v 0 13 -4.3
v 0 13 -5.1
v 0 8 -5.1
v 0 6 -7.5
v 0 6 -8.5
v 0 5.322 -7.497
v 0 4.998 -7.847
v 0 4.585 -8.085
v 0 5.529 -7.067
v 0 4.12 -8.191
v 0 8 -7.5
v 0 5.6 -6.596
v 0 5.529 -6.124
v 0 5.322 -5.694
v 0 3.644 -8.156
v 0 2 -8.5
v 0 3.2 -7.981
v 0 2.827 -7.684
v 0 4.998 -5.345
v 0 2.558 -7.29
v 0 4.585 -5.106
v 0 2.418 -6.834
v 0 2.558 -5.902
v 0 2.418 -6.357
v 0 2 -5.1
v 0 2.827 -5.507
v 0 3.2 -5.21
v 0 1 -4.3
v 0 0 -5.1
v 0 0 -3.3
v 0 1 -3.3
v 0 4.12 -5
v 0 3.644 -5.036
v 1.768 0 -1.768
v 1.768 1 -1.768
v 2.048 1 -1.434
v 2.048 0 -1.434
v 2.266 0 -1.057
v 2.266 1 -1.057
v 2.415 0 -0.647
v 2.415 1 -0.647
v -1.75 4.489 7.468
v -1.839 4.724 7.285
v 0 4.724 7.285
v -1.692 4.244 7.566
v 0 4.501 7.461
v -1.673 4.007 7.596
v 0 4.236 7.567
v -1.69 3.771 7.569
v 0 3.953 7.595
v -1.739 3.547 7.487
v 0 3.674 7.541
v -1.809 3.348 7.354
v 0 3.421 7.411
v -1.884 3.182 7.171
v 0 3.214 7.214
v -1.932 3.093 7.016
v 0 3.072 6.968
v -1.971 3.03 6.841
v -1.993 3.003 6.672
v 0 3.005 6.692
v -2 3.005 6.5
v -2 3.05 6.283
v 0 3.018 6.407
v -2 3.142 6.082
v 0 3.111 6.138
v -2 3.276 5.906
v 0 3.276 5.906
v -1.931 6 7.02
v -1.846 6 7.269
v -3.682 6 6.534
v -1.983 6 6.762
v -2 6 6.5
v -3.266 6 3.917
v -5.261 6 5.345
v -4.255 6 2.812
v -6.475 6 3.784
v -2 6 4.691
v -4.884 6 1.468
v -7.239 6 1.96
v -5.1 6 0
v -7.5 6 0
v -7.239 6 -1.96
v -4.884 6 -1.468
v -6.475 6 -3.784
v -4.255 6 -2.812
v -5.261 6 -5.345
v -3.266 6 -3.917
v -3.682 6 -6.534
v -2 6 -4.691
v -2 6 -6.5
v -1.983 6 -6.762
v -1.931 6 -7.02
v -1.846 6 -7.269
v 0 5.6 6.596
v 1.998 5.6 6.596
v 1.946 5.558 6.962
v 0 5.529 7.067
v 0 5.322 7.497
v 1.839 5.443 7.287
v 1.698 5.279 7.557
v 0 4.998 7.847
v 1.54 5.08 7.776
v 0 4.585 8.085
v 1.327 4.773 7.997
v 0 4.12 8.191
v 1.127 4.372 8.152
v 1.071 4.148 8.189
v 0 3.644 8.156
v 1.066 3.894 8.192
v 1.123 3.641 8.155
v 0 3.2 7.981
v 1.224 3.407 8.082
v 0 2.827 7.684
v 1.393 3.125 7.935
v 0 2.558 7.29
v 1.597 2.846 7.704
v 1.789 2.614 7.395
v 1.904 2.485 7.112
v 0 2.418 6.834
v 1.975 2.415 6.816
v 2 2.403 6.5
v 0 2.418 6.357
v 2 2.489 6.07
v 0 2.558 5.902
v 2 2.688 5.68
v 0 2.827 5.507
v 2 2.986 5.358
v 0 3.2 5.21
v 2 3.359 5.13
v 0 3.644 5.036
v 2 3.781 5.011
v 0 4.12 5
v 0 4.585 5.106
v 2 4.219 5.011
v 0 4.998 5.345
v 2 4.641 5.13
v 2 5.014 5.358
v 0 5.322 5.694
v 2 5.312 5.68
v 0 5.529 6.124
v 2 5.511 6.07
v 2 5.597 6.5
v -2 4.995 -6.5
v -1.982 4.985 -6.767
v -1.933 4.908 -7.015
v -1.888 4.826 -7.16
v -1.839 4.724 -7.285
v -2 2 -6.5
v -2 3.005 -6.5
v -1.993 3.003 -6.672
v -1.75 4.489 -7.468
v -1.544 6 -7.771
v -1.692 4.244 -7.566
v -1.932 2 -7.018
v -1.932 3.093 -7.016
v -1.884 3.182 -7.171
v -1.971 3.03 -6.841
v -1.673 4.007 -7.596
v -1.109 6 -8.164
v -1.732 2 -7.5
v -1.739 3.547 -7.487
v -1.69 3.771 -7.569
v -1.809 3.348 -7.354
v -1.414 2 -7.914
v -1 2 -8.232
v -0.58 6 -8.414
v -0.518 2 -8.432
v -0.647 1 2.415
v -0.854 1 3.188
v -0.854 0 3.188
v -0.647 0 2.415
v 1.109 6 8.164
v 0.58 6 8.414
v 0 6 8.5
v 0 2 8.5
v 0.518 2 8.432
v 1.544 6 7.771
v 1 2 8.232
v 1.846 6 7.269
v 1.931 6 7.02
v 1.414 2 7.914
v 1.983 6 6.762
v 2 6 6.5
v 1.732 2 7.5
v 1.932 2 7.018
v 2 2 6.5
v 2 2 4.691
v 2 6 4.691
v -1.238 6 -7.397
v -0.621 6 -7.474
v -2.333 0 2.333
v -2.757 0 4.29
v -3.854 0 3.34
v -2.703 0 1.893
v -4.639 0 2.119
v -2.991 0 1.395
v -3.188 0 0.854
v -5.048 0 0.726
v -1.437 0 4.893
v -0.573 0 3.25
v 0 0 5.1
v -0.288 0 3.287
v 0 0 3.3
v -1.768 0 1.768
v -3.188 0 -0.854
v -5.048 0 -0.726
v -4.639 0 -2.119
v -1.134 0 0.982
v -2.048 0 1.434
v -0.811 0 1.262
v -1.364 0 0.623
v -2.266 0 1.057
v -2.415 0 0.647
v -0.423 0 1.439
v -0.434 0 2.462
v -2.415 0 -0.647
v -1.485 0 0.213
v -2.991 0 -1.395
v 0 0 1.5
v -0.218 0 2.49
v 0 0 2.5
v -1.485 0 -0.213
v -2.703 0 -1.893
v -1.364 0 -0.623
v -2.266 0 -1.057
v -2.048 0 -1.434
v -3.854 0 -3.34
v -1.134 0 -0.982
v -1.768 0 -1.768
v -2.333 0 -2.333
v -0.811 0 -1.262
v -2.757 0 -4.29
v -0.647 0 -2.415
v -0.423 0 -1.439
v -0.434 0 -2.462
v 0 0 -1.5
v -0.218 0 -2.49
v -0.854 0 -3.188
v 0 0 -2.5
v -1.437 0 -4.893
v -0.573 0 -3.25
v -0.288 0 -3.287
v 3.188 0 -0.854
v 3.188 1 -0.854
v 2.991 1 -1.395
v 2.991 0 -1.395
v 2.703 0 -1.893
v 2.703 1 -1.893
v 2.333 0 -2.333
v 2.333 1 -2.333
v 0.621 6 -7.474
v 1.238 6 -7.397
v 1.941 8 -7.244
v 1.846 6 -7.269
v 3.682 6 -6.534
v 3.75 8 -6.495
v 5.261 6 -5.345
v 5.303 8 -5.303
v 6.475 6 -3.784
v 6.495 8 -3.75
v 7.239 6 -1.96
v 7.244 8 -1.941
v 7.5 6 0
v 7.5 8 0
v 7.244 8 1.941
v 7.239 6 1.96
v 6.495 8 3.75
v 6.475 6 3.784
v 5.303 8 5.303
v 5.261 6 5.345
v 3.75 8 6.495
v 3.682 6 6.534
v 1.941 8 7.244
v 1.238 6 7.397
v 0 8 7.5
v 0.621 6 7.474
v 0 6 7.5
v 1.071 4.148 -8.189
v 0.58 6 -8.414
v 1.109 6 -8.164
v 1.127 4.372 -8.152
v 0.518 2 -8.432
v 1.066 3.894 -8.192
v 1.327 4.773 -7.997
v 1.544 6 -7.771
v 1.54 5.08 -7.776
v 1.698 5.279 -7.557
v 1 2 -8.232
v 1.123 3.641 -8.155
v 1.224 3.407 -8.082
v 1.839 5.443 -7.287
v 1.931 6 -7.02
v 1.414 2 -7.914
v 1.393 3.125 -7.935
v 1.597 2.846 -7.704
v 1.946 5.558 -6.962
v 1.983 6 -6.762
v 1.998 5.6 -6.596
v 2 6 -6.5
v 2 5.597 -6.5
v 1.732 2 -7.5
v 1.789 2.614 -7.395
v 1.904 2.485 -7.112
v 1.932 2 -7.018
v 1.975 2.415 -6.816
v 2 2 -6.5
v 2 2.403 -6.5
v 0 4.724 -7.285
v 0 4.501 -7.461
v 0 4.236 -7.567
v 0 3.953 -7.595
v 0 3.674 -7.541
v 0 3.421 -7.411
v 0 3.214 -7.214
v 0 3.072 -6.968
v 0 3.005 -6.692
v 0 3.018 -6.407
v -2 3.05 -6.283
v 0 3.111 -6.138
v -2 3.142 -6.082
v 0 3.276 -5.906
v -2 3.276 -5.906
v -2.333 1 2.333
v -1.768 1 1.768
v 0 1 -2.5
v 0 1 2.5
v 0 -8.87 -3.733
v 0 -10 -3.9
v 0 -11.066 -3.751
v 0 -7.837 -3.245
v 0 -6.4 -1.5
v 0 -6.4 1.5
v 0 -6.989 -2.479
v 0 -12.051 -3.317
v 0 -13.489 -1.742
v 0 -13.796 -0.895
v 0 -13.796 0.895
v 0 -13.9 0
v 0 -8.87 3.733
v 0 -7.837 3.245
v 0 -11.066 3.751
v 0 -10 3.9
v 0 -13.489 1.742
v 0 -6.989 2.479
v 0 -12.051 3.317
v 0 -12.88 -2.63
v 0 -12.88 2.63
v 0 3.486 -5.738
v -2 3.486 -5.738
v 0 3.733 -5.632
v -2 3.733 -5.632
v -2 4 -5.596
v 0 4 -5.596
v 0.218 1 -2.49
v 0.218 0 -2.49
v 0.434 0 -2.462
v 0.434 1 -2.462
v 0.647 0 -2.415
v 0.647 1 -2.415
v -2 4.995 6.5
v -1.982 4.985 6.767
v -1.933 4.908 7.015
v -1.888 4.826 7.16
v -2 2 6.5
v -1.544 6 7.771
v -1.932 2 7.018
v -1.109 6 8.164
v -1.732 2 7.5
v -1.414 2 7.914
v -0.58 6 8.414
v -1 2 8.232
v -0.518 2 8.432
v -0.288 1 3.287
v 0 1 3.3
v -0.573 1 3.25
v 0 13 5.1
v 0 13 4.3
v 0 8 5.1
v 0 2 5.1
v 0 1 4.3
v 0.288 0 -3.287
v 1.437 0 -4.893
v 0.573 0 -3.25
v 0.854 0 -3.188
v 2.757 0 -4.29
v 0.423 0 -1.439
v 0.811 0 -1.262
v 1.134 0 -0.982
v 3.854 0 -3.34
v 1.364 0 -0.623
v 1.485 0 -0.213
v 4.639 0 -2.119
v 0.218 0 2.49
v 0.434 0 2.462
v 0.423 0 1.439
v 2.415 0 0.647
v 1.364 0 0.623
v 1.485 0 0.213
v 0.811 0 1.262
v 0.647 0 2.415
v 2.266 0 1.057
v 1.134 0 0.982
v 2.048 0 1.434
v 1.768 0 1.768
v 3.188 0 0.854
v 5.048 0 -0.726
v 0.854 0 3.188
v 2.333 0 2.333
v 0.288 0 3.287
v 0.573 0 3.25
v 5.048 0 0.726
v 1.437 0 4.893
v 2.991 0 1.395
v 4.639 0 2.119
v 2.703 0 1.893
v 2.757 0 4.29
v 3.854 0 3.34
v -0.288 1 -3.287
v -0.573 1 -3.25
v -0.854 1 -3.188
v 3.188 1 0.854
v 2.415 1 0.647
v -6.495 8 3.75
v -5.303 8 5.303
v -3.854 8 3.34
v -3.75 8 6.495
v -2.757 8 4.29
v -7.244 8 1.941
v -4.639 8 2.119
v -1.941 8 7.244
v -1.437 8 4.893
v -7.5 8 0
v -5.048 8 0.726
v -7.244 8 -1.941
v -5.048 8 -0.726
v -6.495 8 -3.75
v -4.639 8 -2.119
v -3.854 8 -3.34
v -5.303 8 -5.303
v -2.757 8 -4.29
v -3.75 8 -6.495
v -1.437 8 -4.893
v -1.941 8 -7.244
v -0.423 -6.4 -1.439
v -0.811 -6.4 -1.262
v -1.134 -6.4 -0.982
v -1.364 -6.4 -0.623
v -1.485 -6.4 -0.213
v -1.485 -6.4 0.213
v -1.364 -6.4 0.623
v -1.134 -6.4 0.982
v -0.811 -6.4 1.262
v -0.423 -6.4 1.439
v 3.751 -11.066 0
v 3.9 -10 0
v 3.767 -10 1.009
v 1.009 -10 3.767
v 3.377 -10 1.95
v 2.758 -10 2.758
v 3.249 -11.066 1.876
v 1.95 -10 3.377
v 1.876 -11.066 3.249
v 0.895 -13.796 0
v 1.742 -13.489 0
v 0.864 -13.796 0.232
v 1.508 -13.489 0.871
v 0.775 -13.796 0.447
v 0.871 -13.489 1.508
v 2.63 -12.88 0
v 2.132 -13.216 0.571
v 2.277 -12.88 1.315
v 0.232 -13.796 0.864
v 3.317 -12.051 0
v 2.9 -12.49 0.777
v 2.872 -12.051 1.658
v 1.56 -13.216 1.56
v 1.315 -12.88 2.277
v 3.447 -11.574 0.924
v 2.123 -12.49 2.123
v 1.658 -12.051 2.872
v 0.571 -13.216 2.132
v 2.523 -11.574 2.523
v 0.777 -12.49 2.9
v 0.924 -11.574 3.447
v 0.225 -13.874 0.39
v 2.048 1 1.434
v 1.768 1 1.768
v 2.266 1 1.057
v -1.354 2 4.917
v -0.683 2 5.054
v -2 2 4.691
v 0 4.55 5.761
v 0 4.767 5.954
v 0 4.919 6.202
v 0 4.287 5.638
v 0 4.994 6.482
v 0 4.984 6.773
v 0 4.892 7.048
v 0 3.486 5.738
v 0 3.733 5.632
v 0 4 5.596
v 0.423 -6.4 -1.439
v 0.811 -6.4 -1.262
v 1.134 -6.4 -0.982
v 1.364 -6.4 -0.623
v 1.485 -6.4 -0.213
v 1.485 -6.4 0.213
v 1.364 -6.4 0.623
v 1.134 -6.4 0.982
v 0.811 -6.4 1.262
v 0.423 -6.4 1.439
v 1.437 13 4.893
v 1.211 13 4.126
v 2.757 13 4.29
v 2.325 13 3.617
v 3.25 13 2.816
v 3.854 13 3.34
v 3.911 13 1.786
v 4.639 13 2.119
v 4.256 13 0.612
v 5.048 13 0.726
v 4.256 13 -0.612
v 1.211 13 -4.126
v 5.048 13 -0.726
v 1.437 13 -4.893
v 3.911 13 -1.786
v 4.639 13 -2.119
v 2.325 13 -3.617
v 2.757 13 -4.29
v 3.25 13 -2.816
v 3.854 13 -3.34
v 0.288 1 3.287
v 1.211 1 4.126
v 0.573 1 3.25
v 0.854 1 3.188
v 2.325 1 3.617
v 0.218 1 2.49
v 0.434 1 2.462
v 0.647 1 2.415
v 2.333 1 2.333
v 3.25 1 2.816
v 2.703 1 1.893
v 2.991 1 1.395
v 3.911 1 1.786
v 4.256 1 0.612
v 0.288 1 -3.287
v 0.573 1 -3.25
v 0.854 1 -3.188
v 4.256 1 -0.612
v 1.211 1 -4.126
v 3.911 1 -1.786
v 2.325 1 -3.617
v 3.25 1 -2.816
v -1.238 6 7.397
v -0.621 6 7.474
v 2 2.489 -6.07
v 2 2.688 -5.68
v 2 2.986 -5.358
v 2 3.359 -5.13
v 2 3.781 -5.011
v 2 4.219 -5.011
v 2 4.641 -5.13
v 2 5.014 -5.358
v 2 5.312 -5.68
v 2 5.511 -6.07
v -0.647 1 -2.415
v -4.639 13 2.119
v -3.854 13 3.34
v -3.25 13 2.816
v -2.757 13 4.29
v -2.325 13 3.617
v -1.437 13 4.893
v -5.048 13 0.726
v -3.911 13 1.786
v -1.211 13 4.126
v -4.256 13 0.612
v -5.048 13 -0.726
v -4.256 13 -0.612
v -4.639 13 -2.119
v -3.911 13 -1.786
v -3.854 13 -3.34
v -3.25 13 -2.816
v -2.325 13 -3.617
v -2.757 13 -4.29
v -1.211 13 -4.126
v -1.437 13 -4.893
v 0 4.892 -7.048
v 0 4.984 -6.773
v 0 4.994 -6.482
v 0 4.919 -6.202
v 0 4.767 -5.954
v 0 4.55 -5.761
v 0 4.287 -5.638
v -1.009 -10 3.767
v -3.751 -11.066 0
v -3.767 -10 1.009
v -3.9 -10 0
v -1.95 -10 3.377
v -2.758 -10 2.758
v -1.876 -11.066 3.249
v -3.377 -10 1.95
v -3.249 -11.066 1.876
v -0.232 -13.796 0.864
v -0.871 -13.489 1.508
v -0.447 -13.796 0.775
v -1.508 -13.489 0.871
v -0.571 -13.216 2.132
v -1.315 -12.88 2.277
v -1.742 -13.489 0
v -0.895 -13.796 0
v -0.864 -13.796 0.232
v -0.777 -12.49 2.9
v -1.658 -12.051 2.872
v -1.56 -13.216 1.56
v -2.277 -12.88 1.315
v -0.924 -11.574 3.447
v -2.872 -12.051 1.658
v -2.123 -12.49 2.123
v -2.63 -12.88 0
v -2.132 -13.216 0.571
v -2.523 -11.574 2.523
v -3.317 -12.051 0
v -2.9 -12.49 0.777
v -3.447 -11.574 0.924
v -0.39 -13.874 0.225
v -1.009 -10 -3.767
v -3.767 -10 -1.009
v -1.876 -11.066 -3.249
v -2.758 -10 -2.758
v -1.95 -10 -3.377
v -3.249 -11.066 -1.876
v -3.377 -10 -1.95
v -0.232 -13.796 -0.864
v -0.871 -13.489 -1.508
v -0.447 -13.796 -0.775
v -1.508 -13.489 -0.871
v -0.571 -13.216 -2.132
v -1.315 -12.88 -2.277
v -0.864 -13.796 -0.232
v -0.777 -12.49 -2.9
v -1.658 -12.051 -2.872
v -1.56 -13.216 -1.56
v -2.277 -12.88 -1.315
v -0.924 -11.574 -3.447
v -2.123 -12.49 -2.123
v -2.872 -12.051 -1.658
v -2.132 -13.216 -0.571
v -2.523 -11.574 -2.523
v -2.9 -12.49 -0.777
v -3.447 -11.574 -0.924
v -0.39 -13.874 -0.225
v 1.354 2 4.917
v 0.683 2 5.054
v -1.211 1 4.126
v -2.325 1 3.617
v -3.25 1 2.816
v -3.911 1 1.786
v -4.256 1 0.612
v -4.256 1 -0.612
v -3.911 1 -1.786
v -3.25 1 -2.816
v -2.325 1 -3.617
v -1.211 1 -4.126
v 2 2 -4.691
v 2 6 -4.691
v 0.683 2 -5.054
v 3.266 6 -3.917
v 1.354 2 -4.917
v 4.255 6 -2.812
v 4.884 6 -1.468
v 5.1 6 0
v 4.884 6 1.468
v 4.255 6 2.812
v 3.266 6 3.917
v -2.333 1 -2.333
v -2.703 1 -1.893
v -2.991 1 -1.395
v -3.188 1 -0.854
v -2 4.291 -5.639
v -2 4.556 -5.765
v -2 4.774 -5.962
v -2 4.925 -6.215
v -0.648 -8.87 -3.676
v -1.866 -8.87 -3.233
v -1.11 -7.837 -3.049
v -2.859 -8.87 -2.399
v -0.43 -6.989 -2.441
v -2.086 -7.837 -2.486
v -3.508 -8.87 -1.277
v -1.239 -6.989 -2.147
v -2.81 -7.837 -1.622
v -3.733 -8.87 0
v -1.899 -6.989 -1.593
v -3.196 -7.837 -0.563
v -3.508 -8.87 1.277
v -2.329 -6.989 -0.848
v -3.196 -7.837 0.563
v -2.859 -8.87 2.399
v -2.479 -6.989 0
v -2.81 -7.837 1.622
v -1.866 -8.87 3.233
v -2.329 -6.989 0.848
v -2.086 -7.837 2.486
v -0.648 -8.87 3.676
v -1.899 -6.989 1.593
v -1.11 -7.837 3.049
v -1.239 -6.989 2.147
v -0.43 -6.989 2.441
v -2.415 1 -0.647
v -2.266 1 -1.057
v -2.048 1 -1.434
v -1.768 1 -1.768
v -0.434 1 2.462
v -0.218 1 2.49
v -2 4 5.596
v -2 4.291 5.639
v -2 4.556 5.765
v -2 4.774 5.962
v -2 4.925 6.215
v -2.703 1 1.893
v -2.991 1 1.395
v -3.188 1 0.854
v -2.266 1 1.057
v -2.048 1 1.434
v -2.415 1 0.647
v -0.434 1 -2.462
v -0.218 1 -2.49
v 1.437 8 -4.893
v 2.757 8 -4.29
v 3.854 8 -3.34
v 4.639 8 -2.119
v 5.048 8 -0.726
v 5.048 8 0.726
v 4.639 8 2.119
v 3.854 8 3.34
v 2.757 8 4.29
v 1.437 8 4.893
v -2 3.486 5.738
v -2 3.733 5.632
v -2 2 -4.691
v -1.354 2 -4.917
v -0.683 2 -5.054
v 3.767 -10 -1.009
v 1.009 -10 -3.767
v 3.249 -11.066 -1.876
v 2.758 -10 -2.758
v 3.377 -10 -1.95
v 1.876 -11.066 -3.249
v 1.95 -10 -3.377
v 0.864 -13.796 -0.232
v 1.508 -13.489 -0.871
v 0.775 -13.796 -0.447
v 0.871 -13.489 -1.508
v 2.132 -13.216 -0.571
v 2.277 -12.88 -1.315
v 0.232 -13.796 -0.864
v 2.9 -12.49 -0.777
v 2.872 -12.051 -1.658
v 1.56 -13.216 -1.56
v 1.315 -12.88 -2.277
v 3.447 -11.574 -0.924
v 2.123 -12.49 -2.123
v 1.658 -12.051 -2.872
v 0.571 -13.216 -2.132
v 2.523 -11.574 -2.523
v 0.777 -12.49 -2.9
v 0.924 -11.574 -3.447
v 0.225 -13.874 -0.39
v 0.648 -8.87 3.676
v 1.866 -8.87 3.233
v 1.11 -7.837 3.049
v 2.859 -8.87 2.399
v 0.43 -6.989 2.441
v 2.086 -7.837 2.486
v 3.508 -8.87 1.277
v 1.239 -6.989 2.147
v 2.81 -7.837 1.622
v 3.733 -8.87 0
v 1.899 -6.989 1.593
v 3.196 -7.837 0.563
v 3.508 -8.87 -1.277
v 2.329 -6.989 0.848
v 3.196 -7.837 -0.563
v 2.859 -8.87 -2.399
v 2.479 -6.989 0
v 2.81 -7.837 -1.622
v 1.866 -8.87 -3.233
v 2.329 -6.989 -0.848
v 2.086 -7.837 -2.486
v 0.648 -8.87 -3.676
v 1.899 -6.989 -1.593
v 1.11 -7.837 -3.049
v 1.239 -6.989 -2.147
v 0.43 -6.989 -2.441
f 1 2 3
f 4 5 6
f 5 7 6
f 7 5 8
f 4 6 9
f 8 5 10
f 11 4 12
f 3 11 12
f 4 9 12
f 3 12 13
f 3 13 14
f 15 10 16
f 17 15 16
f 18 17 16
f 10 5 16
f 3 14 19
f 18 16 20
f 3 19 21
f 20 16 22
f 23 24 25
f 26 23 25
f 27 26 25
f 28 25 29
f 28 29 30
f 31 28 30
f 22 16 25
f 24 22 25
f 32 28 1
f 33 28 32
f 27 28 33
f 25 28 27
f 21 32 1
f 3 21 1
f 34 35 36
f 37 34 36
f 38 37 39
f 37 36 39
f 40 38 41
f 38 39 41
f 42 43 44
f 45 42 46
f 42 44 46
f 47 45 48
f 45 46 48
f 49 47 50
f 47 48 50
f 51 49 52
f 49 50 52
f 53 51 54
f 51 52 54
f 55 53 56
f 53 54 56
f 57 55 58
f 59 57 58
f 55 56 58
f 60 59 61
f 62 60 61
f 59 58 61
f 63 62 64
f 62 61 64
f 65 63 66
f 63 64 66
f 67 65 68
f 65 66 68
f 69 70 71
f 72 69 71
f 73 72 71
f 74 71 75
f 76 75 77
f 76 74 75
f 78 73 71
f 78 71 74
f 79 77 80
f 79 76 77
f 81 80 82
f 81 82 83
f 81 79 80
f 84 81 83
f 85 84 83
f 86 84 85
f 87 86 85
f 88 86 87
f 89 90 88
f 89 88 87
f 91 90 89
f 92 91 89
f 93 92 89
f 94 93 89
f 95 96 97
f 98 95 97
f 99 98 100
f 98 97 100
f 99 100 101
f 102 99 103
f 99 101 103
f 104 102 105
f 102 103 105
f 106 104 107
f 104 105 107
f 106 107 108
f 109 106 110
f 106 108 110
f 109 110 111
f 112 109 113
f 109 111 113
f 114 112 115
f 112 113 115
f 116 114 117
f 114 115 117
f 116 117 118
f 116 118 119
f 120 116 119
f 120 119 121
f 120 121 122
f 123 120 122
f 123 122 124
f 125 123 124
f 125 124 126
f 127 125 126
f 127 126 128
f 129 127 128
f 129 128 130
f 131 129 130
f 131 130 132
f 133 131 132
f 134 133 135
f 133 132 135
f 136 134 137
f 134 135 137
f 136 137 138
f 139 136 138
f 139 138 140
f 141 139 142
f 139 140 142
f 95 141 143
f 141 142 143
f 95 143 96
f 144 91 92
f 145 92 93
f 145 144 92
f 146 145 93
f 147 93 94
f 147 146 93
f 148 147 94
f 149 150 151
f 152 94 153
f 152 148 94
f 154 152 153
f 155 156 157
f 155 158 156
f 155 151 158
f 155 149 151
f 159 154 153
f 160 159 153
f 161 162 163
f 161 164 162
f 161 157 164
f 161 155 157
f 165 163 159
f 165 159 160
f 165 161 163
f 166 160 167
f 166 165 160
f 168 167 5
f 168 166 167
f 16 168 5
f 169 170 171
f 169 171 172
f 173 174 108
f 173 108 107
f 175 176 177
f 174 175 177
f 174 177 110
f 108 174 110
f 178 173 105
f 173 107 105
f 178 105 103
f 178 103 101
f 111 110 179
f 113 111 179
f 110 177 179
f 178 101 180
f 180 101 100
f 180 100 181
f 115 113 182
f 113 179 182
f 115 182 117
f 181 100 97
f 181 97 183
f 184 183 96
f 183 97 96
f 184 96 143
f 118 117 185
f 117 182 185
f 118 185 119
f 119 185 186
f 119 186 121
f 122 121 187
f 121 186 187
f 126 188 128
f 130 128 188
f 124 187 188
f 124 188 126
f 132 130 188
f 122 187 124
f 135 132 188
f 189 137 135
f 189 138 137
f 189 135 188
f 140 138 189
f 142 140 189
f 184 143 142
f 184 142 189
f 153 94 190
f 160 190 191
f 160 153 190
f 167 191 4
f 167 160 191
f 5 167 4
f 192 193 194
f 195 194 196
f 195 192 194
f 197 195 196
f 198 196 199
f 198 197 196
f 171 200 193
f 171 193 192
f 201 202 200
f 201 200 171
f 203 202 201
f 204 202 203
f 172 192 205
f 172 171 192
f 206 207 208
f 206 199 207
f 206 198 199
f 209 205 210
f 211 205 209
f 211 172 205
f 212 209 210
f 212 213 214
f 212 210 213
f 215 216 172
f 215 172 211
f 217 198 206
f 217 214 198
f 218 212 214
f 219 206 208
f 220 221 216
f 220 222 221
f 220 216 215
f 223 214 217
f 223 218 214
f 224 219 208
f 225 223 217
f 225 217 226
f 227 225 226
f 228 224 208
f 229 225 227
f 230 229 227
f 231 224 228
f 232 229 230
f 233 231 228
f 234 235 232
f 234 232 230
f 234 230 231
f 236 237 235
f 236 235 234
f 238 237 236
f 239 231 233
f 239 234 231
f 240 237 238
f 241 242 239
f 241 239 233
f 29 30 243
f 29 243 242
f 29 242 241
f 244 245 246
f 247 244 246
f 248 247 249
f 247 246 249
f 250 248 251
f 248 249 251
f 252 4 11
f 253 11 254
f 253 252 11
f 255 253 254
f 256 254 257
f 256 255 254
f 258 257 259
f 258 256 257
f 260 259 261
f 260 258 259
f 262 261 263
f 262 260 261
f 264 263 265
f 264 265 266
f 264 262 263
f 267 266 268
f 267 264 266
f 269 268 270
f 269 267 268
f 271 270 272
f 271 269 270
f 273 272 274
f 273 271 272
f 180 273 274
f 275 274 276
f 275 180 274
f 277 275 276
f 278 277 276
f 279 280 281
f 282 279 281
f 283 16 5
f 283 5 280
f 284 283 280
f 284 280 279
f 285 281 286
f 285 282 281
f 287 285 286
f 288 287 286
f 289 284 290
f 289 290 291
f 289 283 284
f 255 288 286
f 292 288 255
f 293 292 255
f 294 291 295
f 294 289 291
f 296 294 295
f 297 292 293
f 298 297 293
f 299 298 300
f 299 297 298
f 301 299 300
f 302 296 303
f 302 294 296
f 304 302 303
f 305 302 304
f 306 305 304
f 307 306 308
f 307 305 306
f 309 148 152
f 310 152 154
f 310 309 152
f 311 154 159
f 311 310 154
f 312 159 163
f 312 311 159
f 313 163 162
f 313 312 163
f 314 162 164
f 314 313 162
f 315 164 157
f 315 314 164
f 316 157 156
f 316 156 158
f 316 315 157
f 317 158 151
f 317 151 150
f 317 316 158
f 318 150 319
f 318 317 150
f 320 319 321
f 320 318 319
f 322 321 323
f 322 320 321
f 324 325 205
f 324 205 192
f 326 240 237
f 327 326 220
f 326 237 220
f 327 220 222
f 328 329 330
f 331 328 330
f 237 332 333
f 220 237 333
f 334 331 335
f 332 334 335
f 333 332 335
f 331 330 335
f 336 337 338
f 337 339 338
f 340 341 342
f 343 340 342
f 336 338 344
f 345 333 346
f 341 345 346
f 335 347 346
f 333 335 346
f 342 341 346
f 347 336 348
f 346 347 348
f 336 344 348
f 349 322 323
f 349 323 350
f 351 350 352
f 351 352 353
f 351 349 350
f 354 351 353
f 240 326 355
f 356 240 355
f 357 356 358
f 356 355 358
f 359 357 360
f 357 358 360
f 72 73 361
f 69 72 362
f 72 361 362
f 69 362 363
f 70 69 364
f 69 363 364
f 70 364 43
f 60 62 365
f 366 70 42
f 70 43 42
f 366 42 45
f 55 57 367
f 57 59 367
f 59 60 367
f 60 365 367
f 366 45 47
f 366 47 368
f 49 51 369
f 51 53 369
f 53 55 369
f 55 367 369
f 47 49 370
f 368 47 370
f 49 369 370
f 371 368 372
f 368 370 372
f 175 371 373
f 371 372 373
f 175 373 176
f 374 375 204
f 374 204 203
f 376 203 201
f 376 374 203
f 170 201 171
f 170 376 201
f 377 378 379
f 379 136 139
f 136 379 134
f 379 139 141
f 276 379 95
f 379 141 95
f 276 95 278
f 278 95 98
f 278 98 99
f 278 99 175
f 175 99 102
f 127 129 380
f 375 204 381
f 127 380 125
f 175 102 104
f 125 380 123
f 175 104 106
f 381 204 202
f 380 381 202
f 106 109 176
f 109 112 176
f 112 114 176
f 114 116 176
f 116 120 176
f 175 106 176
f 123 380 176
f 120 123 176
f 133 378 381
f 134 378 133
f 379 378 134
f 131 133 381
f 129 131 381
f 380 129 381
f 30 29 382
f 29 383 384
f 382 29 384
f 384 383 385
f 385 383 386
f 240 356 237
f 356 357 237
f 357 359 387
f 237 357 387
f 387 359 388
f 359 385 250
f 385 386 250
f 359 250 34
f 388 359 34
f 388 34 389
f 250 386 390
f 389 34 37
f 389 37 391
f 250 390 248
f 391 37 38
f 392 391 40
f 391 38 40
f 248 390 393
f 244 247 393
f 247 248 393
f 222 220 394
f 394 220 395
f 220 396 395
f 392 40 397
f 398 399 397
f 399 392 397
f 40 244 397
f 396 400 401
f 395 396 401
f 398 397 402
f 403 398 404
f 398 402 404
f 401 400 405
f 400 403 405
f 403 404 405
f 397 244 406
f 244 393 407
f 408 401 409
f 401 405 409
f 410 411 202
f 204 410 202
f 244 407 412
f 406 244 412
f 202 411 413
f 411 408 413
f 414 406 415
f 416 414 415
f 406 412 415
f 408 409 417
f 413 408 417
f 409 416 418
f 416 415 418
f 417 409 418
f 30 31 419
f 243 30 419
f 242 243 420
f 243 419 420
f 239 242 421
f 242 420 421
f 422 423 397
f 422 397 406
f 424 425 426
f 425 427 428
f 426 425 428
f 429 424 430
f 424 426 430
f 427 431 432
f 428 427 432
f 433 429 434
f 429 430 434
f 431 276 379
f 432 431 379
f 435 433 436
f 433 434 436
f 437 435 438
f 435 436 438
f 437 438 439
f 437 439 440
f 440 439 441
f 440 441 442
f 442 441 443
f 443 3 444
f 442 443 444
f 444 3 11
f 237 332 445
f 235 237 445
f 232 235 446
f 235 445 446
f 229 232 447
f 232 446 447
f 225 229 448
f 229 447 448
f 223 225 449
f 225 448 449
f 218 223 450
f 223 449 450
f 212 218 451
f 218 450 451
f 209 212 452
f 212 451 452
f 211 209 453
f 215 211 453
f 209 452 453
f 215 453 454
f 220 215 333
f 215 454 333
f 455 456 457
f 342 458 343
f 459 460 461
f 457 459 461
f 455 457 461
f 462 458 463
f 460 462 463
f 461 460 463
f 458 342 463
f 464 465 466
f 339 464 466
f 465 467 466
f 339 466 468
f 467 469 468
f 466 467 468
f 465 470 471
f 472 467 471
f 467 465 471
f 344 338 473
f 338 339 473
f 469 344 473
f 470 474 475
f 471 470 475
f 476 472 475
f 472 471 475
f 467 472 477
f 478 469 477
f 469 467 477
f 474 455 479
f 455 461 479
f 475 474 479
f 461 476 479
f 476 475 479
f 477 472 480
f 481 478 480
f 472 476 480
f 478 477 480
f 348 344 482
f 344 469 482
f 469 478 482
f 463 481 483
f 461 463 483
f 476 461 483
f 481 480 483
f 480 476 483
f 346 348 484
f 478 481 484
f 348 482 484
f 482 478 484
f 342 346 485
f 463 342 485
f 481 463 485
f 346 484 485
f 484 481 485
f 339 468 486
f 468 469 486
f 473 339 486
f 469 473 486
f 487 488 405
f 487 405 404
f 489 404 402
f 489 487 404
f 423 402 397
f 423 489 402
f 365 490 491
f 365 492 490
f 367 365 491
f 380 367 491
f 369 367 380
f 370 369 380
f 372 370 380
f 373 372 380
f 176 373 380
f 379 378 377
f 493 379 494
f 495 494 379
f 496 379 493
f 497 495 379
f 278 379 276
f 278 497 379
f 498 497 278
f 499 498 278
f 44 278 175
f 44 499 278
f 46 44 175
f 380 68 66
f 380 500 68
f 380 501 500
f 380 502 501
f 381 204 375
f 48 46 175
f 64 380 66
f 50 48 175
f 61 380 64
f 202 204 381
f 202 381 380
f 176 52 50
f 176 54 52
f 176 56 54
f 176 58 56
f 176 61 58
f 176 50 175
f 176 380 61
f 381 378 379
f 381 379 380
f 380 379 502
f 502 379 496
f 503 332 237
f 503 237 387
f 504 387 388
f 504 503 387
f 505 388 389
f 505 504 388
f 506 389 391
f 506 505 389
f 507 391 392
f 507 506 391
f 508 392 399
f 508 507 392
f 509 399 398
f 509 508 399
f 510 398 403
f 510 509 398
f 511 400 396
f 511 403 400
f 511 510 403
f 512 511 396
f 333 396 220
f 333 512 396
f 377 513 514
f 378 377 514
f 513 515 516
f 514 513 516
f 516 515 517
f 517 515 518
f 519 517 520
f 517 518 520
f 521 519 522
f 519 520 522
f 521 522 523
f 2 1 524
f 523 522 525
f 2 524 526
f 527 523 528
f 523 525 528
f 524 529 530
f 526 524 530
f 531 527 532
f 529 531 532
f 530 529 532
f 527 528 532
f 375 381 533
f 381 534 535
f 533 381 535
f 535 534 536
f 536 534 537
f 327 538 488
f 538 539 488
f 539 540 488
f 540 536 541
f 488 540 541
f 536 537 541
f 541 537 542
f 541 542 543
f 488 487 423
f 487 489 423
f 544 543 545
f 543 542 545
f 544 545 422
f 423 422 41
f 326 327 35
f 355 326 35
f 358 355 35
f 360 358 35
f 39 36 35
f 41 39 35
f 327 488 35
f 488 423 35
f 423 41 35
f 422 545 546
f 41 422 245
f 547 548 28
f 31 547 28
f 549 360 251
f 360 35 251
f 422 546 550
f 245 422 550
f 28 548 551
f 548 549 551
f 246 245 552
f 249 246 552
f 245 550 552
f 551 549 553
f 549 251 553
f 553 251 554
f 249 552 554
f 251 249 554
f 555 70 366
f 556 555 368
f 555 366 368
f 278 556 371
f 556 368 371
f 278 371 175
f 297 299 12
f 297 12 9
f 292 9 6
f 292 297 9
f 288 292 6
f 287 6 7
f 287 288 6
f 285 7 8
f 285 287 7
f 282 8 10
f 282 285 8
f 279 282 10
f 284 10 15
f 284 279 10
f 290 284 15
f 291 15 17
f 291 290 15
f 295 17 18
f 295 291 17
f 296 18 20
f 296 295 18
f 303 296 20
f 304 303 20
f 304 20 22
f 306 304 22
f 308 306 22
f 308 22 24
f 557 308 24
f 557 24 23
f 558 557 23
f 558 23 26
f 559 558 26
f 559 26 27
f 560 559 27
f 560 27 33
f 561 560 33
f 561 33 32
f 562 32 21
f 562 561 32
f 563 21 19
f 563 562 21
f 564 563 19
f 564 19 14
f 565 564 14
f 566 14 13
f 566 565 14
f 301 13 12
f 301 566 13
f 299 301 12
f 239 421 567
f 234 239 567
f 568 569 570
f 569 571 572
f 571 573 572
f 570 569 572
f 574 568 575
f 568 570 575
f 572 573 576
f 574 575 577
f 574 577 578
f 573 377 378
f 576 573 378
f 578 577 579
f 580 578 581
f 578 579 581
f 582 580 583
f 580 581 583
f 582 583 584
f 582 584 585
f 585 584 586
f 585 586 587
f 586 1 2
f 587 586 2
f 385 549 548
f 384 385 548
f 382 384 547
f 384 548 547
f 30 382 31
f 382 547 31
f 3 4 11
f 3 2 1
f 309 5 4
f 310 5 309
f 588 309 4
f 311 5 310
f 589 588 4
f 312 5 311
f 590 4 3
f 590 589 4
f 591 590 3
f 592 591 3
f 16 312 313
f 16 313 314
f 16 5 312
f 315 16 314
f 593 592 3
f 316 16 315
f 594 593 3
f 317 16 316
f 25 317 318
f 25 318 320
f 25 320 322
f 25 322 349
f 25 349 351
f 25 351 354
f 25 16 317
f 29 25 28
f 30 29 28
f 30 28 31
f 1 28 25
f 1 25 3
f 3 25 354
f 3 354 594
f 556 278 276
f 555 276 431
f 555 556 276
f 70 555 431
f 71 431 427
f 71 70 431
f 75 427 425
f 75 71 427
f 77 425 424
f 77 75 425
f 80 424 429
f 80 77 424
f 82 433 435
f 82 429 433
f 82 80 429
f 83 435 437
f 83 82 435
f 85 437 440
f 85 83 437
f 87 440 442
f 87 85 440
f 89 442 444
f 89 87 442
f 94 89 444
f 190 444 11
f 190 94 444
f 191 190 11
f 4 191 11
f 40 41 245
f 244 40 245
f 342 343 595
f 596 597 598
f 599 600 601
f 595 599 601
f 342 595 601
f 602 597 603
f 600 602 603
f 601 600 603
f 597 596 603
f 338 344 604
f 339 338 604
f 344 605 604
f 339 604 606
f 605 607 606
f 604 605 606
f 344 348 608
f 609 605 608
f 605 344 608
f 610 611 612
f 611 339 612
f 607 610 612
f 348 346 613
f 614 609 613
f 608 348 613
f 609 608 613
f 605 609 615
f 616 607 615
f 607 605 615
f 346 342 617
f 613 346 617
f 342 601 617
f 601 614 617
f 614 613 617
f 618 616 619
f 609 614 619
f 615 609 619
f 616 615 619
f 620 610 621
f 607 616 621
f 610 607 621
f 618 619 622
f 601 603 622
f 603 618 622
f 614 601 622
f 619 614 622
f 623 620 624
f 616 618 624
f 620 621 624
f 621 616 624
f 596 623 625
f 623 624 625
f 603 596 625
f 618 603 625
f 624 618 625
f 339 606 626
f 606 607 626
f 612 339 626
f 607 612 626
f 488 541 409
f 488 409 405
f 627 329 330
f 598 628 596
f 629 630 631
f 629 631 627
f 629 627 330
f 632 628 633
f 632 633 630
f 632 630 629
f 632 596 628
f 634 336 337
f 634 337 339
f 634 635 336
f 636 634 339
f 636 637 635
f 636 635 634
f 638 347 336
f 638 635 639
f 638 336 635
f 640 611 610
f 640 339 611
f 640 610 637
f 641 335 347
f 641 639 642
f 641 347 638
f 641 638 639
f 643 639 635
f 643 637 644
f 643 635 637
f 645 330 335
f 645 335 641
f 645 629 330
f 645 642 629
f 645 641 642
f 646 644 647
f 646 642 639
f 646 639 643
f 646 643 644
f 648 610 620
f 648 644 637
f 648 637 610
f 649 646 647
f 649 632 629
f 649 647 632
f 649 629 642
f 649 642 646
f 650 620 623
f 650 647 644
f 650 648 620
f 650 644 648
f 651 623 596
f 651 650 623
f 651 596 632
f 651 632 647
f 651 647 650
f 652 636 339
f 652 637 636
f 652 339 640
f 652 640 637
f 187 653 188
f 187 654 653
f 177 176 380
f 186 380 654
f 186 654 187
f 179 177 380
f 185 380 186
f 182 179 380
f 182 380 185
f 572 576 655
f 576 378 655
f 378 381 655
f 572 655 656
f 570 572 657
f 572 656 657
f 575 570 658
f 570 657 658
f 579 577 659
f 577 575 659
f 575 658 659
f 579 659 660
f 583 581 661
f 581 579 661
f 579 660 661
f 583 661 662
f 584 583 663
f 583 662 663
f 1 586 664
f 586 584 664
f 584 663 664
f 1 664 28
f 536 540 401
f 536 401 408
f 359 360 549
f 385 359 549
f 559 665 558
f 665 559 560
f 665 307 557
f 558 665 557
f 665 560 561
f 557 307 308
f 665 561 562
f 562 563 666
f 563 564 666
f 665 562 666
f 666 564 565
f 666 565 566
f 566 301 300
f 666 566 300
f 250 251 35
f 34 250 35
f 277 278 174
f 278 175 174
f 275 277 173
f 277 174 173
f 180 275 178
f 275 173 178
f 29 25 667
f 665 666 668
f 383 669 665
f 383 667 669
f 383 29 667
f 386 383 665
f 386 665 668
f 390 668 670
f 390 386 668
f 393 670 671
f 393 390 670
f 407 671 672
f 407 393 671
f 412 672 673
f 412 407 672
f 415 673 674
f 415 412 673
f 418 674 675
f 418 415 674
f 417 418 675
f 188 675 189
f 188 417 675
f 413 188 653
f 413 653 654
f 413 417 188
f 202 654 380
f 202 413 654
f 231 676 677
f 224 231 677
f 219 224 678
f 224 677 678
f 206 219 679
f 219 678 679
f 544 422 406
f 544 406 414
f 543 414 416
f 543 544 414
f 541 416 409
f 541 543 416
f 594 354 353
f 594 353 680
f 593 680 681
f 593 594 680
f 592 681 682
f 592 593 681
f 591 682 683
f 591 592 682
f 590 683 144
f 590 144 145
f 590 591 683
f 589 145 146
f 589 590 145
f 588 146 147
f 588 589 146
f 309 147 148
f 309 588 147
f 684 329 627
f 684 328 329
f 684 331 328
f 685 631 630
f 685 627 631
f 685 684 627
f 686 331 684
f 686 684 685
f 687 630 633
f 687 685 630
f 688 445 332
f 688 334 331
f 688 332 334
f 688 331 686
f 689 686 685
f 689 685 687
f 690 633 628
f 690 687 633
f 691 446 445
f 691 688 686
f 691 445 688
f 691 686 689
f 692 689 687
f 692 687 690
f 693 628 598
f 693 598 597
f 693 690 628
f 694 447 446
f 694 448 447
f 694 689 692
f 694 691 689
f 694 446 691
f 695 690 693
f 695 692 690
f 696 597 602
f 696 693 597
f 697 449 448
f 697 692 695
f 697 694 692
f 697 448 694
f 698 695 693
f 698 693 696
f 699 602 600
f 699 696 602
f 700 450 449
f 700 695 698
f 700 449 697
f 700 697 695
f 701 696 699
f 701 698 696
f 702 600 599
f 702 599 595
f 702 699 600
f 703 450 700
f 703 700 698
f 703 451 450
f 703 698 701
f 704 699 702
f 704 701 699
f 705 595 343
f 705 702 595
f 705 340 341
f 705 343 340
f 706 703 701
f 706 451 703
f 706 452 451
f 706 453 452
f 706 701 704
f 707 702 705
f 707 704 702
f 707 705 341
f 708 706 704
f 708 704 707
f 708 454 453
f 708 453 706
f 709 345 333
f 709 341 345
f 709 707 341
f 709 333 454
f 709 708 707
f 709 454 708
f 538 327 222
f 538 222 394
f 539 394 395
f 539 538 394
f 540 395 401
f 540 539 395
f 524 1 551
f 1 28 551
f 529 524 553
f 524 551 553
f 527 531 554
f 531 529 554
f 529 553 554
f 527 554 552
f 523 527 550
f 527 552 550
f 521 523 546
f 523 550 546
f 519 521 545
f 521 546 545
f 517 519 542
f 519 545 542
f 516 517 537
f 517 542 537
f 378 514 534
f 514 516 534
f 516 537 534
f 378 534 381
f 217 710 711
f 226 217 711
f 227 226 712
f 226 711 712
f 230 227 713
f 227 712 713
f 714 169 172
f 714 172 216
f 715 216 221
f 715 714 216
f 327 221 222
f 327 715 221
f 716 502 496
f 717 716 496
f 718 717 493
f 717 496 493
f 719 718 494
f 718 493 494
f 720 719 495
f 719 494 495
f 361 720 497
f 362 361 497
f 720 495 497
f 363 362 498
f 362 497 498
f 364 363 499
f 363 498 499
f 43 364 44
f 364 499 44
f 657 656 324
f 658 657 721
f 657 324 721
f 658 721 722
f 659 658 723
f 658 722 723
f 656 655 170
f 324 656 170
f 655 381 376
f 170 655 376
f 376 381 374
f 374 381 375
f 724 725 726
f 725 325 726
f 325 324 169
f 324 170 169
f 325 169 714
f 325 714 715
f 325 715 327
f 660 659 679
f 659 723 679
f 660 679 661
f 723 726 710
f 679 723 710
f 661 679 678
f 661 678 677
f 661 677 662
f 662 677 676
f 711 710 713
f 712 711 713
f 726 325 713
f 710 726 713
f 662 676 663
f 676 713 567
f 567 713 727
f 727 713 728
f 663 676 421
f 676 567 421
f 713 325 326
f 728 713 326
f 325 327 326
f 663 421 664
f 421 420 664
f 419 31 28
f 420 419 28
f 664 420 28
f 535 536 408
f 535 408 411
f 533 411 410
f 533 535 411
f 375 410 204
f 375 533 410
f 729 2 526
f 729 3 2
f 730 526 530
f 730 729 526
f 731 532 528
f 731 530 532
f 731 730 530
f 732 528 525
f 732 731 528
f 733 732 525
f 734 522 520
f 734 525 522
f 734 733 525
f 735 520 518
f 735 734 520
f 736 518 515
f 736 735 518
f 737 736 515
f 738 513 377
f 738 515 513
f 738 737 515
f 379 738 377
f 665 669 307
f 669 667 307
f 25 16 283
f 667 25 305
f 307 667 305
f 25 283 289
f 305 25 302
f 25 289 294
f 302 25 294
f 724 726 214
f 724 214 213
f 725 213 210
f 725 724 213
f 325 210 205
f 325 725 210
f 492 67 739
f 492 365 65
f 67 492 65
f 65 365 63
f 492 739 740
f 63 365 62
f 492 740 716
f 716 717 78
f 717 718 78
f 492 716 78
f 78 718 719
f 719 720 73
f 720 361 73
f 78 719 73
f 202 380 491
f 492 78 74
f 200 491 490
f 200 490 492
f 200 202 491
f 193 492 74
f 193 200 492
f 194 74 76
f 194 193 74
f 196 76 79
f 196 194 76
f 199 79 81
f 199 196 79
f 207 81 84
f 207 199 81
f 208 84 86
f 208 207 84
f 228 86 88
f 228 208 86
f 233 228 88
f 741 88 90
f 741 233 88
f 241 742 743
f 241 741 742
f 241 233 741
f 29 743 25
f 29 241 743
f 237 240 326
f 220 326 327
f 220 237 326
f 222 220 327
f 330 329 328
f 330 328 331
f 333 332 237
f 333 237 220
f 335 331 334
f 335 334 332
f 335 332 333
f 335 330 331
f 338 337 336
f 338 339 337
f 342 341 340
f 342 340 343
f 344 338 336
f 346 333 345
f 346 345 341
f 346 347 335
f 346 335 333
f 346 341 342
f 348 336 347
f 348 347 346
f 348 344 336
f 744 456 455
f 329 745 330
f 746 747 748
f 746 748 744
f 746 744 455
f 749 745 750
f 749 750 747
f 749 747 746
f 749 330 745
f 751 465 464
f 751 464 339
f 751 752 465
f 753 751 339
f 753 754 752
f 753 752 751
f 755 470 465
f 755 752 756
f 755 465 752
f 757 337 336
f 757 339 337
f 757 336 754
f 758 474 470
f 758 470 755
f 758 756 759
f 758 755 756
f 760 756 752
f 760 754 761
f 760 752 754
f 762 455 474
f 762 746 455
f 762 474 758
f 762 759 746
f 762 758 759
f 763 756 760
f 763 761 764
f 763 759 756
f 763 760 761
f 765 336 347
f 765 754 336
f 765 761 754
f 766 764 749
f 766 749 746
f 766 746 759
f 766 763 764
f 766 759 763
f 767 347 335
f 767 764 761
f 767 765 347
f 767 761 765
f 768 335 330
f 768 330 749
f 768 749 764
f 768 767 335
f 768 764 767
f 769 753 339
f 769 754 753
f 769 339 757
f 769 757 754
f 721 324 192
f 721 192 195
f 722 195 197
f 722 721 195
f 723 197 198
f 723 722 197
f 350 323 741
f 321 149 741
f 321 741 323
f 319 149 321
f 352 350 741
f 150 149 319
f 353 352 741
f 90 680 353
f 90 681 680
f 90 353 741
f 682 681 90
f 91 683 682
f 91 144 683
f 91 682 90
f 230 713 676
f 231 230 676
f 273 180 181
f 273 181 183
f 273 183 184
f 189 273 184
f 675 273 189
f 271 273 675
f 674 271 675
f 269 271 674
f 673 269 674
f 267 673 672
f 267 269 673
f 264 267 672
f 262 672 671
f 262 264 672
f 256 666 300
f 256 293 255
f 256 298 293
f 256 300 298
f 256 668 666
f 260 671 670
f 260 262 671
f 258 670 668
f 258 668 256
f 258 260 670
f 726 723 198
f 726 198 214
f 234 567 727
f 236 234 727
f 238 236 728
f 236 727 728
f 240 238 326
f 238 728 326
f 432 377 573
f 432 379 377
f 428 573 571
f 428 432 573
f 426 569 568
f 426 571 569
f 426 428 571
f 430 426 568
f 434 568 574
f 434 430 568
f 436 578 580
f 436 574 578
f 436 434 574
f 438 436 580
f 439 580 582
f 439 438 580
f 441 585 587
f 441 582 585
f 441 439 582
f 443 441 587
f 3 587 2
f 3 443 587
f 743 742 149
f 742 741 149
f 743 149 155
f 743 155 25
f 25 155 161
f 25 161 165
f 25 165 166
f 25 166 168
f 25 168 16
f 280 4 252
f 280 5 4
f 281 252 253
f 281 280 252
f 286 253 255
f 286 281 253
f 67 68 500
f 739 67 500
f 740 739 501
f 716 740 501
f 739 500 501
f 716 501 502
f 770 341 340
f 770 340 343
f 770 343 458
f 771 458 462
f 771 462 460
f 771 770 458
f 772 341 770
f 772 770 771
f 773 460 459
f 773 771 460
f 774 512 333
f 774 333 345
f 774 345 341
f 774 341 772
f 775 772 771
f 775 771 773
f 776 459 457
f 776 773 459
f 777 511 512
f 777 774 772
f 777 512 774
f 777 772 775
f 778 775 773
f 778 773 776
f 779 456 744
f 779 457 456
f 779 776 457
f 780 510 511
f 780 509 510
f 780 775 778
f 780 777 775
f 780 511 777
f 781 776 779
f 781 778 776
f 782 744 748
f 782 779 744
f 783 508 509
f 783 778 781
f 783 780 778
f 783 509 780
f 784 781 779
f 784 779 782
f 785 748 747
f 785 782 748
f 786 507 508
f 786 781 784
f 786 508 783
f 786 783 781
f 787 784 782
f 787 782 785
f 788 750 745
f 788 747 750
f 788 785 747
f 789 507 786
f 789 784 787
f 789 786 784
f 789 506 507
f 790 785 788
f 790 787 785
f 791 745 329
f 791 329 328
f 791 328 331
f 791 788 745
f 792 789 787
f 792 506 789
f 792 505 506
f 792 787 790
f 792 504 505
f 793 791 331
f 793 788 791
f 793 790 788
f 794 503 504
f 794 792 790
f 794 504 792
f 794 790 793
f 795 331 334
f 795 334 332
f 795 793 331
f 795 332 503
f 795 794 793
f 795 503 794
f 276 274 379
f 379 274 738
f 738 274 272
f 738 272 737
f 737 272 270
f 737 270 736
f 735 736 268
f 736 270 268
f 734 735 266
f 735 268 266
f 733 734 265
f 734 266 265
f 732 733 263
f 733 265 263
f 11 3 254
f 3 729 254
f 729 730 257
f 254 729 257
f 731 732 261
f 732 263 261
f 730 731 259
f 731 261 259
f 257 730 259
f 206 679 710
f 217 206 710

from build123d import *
from build123d.topology import SkipClean

# Parameters (mm, degrees)
SKETCH2_R           = 5.1
BOSS_EXTRUDE1_DEPTH = 1
SKETCH3_R           = 5.1
SKETCH3_R_2         = 4.3
BOSS_EXTRUDE2_DEPTH = 12
CUT_EXTRUDE2_DEPTH  = 1
SKETCH7_R           = 7.5
SKETCH7_R_2         = 5.1
BOSS_EXTRUDE4_DEPTH = 2
BOSS_EXTRUDE5_REACH = 24.482
SKETCH11_W          = 4
SKETCH11_H          = 4
CUT_EXTRUDE3_DEPTH  = 10
SKETCH13_3_R        = 1.6
SKETCH13_3_R_2      = 1
CUT_EXTRUDE4_DEPTH  = 2
FILLET1_R           = 2


# Read off the part's stored shape, not the designer's step: Mirror1
with BuildPart() as part:
    # Sketch2 → Boss-Extrude1 (new body)
    with BuildSketch(Plane(origin=(0, 0, 0), x_dir=(1, 0, 0), z_dir=(0, 1, 0))):
        with Locations(Location((0, 0, 0), (0, 0, 270))):
            Circle(SKETCH2_R)
    extrude(amount=BOSS_EXTRUDE1_DEPTH)

    # Sketch3 → Boss-Extrude2 (add)
    with BuildSketch(Plane(origin=(0, 1, 0), x_dir=(1, 0, 0), z_dir=(0, 1, 0))):
        with Locations(Location((0, 0, 0), (0, 0, 270))):
            Circle(SKETCH3_R)
        with Locations(Location((0, 0, 0), (0, 0, 270))):
            Circle(SKETCH3_R_2, mode=Mode.SUBTRACT)
    extrude(amount=BOSS_EXTRUDE2_DEPTH)

    # Sketch6 → Cut-Extrude2 (cut)
    with BuildSketch(Plane(origin=(0, 1, 0), x_dir=(1, 0, 0), z_dir=(0, 1, 0))):
        with BuildLine():
            ThreePointArc((-1.767767, 1.767767), (-2.165064, 1.25), (-2.414815, 0.647048))
            Line((-2.414815, 0.647048), (-3.187555, 0.854103))
            ThreePointArc((-3.187555, 0.854103), (-2.857884, 1.65), (-2.333452, 2.333452))
            Line((-2.333452, 2.333452), (-1.767767, 1.767767))
        make_face()
        with BuildLine():
            ThreePointArc((2.414815, 0.647048), (2.165064, 1.25), (1.767767, 1.767767))
            Line((1.767767, 1.767767), (2.333452, 2.333452))
            ThreePointArc((2.333452, 2.333452), (2.857884, 1.65), (3.187555, 0.854103))
            Line((3.187555, 0.854103), (2.414815, 0.647048))
        make_face()
        with BuildLine():
            ThreePointArc((1.767767, -1.767767), (2.165064, -1.25), (2.414815, -0.647048))
            Line((2.414815, -0.647048), (3.187555, -0.854103))
            ThreePointArc((3.187555, -0.854103), (2.857884, -1.65), (2.333452, -2.333452))
            Line((2.333452, -2.333452), (1.767767, -1.767767))
        make_face()
        with BuildLine():
            ThreePointArc((-0.647048, -2.414815), (0, -2.5), (0.647048, -2.414815))
            Line((0.647048, -2.414815), (0.854103, -3.187555))
            ThreePointArc((0.854103, -3.187555), (0, -3.3), (-0.854103, -3.187555))
            Line((-0.854103, -3.187555), (-0.647048, -2.414815))
        make_face()
        with BuildLine():
            ThreePointArc((-2.414815, -0.647048), (-2.165064, -1.25), (-1.767767, -1.767767))
            Line((-1.767767, -1.767767), (-2.333452, -2.333452))
            ThreePointArc((-2.333452, -2.333452), (-2.857884, -1.65), (-3.187555, -0.854103))
            Line((-3.187555, -0.854103), (-2.414815, -0.647048))
        make_face()
        with BuildLine():
            ThreePointArc((0.647048, 2.414815), (0, 2.5), (-0.647048, 2.414815))
            Line((-0.647048, 2.414815), (-0.854103, 3.187555))
            ThreePointArc((-0.854103, 3.187555), (0, 3.3), (0.854103, 3.187555))
            Line((0.854103, 3.187555), (0.647048, 2.414815))
        make_face()
    extrude(amount=-CUT_EXTRUDE2_DEPTH, mode=Mode.SUBTRACT)

    # Sketch7 → Boss-Extrude4 (add)
    with BuildSketch(Plane(origin=(0, 6, 0), x_dir=(1, 0, 0), z_dir=(0, 1, 0))):
        with Locations(Location((0, 0, 0), (0, 0, 270))):
            Circle(SKETCH7_R)
        with Locations(Location((0, 0, 0), (0, 0, 270))):
            Circle(SKETCH7_R_2, mode=Mode.SUBTRACT)
    extrude(amount=BOSS_EXTRUDE4_DEPTH)

    # Sketch8 → Revolve1 (revolve)
    with SkipClean():  # the faces are left unmerged after this step: merging them gives an invalid solid
        with BuildSketch(Plane(origin=(0, 0, 0), x_dir=(0, 0, -1), z_dir=(1, 0, 0)), mode=Mode.PRIVATE) as revolve1_sk:
            with BuildLine():
                ThreePointArc((1.5, -6.4), (0.764853, -6.175735), (0, -6.1))
                Line((0, -6.1), (0, -10))
                Line((0, -10), (0, -13.9))
                ThreePointArc((0, -13.9), (2.757716, -12.757716), (3.9, -10))
                ThreePointArc((3.9, -10), (3.244996, -7.836669), (1.5, -6.4))
            make_face()
            with BuildLine():
                Line((0, -10), (0, -6.1))
                ThreePointArc((0, -6.1), (-0.764853, -6.175735), (-1.5, -6.4))
                ThreePointArc((-1.5, -6.4), (-3.824265, -10.764853), (0, -13.9))
                Line((0, -13.9), (0, -10))
            make_face()
            with BuildLine():
                Line((0, -6.1), (0, 0))
                Line((0, 0), (-1.5, 0))
                Line((-1.5, 0), (-1.5, -6.4))
                ThreePointArc((-1.5, -6.4), (-0.764853, -6.175735), (0, -6.1))
            make_face()
        revolve(revolve1_sk.sketch.rotate(Axis((0, 0, 0), (0, -1, 0)), 180), axis=Axis((0, 0, 0), (0, -1, 0)))

    # Sketch11 → Boss-Extrude5 (add, up to next)
    with BuildSketch(Plane.XY.offset(8.5), mode=Mode.PRIVATE) as boss_extrude5_sk1:
        with Locations((0, 4)):
            Rectangle(SKETCH11_W, SKETCH11_H)
    boss_extrude5_tool1 = extrude(boss_extrude5_sk1.sketch, amount=-BOSS_EXTRUDE5_REACH, mode=Mode.PRIVATE) - part.part
    add(boss_extrude5_tool1.solids().sort_by_distance((0, 4, 8.5))[0])

    # Sketch13 → Cut-Extrude3 (cut)
    with BuildSketch(Plane(origin=(2, 0, 0), x_dir=(0, 0, -1), z_dir=(1, 0, 0))):
        with BuildLine():
            ThreePointArc((-7.285301, 4.724229), (-7.31997, 3.31044), (-5.906181, 3.275771))
            Line((-5.906181, 3.275771), (-7.285301, 4.724229))
        make_face()
        with BuildLine():
            Line((-7.285301, 4.724229), (-5.906181, 3.275771))
            ThreePointArc((-5.906181, 3.275771), (-5.676622, 3.60602), (-5.595741, 4))
            ThreePointArc((-5.595741, 4), (-6.201761, 4.919119), (-7.285301, 4.724229))
        make_face()
    extrude(amount=-CUT_EXTRUDE3_DEPTH, mode=Mode.SUBTRACT)

    # Sketch13<3> → Cut-Extrude4 (cut)
    with BuildSketch(Plane(origin=(2, 0, 0), x_dir=(0, 0, -1), z_dir=(1, 0, 0))):
        with Locations(Location((-6.595741, 4, 0), (0, 0, 90))):
            Circle(SKETCH13_3_R)
        with Locations(Location((-6.595741, 4, 0), (0, 0, 90))):
            Circle(SKETCH13_3_R_2, mode=Mode.SUBTRACT)
    extrude(amount=-CUT_EXTRUDE4_DEPTH, mode=Mode.SUBTRACT)

    # Fillet1
    # the kernel refuses this fillet: 2 mm, written as the material it takes off along each edge
    with BuildSketch(Plane(origin=(-2, 6, 8.5), x_dir=(1, 0, 0), z_dir=(0, -1, 0)), Plane(origin=(2, -3, 8.5), x_dir=(-1, 0, 0), z_dir=(0, 1, 0))) as fillet1_piece_1:
        with BuildLine():
            CenterArc((FILLET1_R, -FILLET1_R), FILLET1_R, 90, 90)
            Line((0, -FILLET1_R), (0, 0))
            Line((0, 0), (FILLET1_R, 0))
        make_face()
    extrude(amount=9, mode=Mode.SUBTRACT)

    # Mirror1
    split(bisect_by=Plane.XY, keep=Keep.TOP)

    # Mirror1 2: part across plane


with BuildPart() as part_1:
    add(part.part)
    add(part.part.mirror(Plane.XY))


with BuildPart() as body_2:
    # Split1: the piece on the far side of the plane
    add(part_1.part)
    split(bisect_by=Plane(origin=(0, 0, 0), x_dir=(0, 0, 1), z_dir=(1, 0, 0)), keep=Keep.BOTTOM)


with BuildPart() as part_2:
    add(part_1.part)

    # Split1
    split(bisect_by=Plane(origin=(0, 0, 0), x_dir=(0, 0, 1), z_dir=(1, 0, 0)), keep=Keep.TOP)


solid = Compound([body_2.part, part_2.part])
